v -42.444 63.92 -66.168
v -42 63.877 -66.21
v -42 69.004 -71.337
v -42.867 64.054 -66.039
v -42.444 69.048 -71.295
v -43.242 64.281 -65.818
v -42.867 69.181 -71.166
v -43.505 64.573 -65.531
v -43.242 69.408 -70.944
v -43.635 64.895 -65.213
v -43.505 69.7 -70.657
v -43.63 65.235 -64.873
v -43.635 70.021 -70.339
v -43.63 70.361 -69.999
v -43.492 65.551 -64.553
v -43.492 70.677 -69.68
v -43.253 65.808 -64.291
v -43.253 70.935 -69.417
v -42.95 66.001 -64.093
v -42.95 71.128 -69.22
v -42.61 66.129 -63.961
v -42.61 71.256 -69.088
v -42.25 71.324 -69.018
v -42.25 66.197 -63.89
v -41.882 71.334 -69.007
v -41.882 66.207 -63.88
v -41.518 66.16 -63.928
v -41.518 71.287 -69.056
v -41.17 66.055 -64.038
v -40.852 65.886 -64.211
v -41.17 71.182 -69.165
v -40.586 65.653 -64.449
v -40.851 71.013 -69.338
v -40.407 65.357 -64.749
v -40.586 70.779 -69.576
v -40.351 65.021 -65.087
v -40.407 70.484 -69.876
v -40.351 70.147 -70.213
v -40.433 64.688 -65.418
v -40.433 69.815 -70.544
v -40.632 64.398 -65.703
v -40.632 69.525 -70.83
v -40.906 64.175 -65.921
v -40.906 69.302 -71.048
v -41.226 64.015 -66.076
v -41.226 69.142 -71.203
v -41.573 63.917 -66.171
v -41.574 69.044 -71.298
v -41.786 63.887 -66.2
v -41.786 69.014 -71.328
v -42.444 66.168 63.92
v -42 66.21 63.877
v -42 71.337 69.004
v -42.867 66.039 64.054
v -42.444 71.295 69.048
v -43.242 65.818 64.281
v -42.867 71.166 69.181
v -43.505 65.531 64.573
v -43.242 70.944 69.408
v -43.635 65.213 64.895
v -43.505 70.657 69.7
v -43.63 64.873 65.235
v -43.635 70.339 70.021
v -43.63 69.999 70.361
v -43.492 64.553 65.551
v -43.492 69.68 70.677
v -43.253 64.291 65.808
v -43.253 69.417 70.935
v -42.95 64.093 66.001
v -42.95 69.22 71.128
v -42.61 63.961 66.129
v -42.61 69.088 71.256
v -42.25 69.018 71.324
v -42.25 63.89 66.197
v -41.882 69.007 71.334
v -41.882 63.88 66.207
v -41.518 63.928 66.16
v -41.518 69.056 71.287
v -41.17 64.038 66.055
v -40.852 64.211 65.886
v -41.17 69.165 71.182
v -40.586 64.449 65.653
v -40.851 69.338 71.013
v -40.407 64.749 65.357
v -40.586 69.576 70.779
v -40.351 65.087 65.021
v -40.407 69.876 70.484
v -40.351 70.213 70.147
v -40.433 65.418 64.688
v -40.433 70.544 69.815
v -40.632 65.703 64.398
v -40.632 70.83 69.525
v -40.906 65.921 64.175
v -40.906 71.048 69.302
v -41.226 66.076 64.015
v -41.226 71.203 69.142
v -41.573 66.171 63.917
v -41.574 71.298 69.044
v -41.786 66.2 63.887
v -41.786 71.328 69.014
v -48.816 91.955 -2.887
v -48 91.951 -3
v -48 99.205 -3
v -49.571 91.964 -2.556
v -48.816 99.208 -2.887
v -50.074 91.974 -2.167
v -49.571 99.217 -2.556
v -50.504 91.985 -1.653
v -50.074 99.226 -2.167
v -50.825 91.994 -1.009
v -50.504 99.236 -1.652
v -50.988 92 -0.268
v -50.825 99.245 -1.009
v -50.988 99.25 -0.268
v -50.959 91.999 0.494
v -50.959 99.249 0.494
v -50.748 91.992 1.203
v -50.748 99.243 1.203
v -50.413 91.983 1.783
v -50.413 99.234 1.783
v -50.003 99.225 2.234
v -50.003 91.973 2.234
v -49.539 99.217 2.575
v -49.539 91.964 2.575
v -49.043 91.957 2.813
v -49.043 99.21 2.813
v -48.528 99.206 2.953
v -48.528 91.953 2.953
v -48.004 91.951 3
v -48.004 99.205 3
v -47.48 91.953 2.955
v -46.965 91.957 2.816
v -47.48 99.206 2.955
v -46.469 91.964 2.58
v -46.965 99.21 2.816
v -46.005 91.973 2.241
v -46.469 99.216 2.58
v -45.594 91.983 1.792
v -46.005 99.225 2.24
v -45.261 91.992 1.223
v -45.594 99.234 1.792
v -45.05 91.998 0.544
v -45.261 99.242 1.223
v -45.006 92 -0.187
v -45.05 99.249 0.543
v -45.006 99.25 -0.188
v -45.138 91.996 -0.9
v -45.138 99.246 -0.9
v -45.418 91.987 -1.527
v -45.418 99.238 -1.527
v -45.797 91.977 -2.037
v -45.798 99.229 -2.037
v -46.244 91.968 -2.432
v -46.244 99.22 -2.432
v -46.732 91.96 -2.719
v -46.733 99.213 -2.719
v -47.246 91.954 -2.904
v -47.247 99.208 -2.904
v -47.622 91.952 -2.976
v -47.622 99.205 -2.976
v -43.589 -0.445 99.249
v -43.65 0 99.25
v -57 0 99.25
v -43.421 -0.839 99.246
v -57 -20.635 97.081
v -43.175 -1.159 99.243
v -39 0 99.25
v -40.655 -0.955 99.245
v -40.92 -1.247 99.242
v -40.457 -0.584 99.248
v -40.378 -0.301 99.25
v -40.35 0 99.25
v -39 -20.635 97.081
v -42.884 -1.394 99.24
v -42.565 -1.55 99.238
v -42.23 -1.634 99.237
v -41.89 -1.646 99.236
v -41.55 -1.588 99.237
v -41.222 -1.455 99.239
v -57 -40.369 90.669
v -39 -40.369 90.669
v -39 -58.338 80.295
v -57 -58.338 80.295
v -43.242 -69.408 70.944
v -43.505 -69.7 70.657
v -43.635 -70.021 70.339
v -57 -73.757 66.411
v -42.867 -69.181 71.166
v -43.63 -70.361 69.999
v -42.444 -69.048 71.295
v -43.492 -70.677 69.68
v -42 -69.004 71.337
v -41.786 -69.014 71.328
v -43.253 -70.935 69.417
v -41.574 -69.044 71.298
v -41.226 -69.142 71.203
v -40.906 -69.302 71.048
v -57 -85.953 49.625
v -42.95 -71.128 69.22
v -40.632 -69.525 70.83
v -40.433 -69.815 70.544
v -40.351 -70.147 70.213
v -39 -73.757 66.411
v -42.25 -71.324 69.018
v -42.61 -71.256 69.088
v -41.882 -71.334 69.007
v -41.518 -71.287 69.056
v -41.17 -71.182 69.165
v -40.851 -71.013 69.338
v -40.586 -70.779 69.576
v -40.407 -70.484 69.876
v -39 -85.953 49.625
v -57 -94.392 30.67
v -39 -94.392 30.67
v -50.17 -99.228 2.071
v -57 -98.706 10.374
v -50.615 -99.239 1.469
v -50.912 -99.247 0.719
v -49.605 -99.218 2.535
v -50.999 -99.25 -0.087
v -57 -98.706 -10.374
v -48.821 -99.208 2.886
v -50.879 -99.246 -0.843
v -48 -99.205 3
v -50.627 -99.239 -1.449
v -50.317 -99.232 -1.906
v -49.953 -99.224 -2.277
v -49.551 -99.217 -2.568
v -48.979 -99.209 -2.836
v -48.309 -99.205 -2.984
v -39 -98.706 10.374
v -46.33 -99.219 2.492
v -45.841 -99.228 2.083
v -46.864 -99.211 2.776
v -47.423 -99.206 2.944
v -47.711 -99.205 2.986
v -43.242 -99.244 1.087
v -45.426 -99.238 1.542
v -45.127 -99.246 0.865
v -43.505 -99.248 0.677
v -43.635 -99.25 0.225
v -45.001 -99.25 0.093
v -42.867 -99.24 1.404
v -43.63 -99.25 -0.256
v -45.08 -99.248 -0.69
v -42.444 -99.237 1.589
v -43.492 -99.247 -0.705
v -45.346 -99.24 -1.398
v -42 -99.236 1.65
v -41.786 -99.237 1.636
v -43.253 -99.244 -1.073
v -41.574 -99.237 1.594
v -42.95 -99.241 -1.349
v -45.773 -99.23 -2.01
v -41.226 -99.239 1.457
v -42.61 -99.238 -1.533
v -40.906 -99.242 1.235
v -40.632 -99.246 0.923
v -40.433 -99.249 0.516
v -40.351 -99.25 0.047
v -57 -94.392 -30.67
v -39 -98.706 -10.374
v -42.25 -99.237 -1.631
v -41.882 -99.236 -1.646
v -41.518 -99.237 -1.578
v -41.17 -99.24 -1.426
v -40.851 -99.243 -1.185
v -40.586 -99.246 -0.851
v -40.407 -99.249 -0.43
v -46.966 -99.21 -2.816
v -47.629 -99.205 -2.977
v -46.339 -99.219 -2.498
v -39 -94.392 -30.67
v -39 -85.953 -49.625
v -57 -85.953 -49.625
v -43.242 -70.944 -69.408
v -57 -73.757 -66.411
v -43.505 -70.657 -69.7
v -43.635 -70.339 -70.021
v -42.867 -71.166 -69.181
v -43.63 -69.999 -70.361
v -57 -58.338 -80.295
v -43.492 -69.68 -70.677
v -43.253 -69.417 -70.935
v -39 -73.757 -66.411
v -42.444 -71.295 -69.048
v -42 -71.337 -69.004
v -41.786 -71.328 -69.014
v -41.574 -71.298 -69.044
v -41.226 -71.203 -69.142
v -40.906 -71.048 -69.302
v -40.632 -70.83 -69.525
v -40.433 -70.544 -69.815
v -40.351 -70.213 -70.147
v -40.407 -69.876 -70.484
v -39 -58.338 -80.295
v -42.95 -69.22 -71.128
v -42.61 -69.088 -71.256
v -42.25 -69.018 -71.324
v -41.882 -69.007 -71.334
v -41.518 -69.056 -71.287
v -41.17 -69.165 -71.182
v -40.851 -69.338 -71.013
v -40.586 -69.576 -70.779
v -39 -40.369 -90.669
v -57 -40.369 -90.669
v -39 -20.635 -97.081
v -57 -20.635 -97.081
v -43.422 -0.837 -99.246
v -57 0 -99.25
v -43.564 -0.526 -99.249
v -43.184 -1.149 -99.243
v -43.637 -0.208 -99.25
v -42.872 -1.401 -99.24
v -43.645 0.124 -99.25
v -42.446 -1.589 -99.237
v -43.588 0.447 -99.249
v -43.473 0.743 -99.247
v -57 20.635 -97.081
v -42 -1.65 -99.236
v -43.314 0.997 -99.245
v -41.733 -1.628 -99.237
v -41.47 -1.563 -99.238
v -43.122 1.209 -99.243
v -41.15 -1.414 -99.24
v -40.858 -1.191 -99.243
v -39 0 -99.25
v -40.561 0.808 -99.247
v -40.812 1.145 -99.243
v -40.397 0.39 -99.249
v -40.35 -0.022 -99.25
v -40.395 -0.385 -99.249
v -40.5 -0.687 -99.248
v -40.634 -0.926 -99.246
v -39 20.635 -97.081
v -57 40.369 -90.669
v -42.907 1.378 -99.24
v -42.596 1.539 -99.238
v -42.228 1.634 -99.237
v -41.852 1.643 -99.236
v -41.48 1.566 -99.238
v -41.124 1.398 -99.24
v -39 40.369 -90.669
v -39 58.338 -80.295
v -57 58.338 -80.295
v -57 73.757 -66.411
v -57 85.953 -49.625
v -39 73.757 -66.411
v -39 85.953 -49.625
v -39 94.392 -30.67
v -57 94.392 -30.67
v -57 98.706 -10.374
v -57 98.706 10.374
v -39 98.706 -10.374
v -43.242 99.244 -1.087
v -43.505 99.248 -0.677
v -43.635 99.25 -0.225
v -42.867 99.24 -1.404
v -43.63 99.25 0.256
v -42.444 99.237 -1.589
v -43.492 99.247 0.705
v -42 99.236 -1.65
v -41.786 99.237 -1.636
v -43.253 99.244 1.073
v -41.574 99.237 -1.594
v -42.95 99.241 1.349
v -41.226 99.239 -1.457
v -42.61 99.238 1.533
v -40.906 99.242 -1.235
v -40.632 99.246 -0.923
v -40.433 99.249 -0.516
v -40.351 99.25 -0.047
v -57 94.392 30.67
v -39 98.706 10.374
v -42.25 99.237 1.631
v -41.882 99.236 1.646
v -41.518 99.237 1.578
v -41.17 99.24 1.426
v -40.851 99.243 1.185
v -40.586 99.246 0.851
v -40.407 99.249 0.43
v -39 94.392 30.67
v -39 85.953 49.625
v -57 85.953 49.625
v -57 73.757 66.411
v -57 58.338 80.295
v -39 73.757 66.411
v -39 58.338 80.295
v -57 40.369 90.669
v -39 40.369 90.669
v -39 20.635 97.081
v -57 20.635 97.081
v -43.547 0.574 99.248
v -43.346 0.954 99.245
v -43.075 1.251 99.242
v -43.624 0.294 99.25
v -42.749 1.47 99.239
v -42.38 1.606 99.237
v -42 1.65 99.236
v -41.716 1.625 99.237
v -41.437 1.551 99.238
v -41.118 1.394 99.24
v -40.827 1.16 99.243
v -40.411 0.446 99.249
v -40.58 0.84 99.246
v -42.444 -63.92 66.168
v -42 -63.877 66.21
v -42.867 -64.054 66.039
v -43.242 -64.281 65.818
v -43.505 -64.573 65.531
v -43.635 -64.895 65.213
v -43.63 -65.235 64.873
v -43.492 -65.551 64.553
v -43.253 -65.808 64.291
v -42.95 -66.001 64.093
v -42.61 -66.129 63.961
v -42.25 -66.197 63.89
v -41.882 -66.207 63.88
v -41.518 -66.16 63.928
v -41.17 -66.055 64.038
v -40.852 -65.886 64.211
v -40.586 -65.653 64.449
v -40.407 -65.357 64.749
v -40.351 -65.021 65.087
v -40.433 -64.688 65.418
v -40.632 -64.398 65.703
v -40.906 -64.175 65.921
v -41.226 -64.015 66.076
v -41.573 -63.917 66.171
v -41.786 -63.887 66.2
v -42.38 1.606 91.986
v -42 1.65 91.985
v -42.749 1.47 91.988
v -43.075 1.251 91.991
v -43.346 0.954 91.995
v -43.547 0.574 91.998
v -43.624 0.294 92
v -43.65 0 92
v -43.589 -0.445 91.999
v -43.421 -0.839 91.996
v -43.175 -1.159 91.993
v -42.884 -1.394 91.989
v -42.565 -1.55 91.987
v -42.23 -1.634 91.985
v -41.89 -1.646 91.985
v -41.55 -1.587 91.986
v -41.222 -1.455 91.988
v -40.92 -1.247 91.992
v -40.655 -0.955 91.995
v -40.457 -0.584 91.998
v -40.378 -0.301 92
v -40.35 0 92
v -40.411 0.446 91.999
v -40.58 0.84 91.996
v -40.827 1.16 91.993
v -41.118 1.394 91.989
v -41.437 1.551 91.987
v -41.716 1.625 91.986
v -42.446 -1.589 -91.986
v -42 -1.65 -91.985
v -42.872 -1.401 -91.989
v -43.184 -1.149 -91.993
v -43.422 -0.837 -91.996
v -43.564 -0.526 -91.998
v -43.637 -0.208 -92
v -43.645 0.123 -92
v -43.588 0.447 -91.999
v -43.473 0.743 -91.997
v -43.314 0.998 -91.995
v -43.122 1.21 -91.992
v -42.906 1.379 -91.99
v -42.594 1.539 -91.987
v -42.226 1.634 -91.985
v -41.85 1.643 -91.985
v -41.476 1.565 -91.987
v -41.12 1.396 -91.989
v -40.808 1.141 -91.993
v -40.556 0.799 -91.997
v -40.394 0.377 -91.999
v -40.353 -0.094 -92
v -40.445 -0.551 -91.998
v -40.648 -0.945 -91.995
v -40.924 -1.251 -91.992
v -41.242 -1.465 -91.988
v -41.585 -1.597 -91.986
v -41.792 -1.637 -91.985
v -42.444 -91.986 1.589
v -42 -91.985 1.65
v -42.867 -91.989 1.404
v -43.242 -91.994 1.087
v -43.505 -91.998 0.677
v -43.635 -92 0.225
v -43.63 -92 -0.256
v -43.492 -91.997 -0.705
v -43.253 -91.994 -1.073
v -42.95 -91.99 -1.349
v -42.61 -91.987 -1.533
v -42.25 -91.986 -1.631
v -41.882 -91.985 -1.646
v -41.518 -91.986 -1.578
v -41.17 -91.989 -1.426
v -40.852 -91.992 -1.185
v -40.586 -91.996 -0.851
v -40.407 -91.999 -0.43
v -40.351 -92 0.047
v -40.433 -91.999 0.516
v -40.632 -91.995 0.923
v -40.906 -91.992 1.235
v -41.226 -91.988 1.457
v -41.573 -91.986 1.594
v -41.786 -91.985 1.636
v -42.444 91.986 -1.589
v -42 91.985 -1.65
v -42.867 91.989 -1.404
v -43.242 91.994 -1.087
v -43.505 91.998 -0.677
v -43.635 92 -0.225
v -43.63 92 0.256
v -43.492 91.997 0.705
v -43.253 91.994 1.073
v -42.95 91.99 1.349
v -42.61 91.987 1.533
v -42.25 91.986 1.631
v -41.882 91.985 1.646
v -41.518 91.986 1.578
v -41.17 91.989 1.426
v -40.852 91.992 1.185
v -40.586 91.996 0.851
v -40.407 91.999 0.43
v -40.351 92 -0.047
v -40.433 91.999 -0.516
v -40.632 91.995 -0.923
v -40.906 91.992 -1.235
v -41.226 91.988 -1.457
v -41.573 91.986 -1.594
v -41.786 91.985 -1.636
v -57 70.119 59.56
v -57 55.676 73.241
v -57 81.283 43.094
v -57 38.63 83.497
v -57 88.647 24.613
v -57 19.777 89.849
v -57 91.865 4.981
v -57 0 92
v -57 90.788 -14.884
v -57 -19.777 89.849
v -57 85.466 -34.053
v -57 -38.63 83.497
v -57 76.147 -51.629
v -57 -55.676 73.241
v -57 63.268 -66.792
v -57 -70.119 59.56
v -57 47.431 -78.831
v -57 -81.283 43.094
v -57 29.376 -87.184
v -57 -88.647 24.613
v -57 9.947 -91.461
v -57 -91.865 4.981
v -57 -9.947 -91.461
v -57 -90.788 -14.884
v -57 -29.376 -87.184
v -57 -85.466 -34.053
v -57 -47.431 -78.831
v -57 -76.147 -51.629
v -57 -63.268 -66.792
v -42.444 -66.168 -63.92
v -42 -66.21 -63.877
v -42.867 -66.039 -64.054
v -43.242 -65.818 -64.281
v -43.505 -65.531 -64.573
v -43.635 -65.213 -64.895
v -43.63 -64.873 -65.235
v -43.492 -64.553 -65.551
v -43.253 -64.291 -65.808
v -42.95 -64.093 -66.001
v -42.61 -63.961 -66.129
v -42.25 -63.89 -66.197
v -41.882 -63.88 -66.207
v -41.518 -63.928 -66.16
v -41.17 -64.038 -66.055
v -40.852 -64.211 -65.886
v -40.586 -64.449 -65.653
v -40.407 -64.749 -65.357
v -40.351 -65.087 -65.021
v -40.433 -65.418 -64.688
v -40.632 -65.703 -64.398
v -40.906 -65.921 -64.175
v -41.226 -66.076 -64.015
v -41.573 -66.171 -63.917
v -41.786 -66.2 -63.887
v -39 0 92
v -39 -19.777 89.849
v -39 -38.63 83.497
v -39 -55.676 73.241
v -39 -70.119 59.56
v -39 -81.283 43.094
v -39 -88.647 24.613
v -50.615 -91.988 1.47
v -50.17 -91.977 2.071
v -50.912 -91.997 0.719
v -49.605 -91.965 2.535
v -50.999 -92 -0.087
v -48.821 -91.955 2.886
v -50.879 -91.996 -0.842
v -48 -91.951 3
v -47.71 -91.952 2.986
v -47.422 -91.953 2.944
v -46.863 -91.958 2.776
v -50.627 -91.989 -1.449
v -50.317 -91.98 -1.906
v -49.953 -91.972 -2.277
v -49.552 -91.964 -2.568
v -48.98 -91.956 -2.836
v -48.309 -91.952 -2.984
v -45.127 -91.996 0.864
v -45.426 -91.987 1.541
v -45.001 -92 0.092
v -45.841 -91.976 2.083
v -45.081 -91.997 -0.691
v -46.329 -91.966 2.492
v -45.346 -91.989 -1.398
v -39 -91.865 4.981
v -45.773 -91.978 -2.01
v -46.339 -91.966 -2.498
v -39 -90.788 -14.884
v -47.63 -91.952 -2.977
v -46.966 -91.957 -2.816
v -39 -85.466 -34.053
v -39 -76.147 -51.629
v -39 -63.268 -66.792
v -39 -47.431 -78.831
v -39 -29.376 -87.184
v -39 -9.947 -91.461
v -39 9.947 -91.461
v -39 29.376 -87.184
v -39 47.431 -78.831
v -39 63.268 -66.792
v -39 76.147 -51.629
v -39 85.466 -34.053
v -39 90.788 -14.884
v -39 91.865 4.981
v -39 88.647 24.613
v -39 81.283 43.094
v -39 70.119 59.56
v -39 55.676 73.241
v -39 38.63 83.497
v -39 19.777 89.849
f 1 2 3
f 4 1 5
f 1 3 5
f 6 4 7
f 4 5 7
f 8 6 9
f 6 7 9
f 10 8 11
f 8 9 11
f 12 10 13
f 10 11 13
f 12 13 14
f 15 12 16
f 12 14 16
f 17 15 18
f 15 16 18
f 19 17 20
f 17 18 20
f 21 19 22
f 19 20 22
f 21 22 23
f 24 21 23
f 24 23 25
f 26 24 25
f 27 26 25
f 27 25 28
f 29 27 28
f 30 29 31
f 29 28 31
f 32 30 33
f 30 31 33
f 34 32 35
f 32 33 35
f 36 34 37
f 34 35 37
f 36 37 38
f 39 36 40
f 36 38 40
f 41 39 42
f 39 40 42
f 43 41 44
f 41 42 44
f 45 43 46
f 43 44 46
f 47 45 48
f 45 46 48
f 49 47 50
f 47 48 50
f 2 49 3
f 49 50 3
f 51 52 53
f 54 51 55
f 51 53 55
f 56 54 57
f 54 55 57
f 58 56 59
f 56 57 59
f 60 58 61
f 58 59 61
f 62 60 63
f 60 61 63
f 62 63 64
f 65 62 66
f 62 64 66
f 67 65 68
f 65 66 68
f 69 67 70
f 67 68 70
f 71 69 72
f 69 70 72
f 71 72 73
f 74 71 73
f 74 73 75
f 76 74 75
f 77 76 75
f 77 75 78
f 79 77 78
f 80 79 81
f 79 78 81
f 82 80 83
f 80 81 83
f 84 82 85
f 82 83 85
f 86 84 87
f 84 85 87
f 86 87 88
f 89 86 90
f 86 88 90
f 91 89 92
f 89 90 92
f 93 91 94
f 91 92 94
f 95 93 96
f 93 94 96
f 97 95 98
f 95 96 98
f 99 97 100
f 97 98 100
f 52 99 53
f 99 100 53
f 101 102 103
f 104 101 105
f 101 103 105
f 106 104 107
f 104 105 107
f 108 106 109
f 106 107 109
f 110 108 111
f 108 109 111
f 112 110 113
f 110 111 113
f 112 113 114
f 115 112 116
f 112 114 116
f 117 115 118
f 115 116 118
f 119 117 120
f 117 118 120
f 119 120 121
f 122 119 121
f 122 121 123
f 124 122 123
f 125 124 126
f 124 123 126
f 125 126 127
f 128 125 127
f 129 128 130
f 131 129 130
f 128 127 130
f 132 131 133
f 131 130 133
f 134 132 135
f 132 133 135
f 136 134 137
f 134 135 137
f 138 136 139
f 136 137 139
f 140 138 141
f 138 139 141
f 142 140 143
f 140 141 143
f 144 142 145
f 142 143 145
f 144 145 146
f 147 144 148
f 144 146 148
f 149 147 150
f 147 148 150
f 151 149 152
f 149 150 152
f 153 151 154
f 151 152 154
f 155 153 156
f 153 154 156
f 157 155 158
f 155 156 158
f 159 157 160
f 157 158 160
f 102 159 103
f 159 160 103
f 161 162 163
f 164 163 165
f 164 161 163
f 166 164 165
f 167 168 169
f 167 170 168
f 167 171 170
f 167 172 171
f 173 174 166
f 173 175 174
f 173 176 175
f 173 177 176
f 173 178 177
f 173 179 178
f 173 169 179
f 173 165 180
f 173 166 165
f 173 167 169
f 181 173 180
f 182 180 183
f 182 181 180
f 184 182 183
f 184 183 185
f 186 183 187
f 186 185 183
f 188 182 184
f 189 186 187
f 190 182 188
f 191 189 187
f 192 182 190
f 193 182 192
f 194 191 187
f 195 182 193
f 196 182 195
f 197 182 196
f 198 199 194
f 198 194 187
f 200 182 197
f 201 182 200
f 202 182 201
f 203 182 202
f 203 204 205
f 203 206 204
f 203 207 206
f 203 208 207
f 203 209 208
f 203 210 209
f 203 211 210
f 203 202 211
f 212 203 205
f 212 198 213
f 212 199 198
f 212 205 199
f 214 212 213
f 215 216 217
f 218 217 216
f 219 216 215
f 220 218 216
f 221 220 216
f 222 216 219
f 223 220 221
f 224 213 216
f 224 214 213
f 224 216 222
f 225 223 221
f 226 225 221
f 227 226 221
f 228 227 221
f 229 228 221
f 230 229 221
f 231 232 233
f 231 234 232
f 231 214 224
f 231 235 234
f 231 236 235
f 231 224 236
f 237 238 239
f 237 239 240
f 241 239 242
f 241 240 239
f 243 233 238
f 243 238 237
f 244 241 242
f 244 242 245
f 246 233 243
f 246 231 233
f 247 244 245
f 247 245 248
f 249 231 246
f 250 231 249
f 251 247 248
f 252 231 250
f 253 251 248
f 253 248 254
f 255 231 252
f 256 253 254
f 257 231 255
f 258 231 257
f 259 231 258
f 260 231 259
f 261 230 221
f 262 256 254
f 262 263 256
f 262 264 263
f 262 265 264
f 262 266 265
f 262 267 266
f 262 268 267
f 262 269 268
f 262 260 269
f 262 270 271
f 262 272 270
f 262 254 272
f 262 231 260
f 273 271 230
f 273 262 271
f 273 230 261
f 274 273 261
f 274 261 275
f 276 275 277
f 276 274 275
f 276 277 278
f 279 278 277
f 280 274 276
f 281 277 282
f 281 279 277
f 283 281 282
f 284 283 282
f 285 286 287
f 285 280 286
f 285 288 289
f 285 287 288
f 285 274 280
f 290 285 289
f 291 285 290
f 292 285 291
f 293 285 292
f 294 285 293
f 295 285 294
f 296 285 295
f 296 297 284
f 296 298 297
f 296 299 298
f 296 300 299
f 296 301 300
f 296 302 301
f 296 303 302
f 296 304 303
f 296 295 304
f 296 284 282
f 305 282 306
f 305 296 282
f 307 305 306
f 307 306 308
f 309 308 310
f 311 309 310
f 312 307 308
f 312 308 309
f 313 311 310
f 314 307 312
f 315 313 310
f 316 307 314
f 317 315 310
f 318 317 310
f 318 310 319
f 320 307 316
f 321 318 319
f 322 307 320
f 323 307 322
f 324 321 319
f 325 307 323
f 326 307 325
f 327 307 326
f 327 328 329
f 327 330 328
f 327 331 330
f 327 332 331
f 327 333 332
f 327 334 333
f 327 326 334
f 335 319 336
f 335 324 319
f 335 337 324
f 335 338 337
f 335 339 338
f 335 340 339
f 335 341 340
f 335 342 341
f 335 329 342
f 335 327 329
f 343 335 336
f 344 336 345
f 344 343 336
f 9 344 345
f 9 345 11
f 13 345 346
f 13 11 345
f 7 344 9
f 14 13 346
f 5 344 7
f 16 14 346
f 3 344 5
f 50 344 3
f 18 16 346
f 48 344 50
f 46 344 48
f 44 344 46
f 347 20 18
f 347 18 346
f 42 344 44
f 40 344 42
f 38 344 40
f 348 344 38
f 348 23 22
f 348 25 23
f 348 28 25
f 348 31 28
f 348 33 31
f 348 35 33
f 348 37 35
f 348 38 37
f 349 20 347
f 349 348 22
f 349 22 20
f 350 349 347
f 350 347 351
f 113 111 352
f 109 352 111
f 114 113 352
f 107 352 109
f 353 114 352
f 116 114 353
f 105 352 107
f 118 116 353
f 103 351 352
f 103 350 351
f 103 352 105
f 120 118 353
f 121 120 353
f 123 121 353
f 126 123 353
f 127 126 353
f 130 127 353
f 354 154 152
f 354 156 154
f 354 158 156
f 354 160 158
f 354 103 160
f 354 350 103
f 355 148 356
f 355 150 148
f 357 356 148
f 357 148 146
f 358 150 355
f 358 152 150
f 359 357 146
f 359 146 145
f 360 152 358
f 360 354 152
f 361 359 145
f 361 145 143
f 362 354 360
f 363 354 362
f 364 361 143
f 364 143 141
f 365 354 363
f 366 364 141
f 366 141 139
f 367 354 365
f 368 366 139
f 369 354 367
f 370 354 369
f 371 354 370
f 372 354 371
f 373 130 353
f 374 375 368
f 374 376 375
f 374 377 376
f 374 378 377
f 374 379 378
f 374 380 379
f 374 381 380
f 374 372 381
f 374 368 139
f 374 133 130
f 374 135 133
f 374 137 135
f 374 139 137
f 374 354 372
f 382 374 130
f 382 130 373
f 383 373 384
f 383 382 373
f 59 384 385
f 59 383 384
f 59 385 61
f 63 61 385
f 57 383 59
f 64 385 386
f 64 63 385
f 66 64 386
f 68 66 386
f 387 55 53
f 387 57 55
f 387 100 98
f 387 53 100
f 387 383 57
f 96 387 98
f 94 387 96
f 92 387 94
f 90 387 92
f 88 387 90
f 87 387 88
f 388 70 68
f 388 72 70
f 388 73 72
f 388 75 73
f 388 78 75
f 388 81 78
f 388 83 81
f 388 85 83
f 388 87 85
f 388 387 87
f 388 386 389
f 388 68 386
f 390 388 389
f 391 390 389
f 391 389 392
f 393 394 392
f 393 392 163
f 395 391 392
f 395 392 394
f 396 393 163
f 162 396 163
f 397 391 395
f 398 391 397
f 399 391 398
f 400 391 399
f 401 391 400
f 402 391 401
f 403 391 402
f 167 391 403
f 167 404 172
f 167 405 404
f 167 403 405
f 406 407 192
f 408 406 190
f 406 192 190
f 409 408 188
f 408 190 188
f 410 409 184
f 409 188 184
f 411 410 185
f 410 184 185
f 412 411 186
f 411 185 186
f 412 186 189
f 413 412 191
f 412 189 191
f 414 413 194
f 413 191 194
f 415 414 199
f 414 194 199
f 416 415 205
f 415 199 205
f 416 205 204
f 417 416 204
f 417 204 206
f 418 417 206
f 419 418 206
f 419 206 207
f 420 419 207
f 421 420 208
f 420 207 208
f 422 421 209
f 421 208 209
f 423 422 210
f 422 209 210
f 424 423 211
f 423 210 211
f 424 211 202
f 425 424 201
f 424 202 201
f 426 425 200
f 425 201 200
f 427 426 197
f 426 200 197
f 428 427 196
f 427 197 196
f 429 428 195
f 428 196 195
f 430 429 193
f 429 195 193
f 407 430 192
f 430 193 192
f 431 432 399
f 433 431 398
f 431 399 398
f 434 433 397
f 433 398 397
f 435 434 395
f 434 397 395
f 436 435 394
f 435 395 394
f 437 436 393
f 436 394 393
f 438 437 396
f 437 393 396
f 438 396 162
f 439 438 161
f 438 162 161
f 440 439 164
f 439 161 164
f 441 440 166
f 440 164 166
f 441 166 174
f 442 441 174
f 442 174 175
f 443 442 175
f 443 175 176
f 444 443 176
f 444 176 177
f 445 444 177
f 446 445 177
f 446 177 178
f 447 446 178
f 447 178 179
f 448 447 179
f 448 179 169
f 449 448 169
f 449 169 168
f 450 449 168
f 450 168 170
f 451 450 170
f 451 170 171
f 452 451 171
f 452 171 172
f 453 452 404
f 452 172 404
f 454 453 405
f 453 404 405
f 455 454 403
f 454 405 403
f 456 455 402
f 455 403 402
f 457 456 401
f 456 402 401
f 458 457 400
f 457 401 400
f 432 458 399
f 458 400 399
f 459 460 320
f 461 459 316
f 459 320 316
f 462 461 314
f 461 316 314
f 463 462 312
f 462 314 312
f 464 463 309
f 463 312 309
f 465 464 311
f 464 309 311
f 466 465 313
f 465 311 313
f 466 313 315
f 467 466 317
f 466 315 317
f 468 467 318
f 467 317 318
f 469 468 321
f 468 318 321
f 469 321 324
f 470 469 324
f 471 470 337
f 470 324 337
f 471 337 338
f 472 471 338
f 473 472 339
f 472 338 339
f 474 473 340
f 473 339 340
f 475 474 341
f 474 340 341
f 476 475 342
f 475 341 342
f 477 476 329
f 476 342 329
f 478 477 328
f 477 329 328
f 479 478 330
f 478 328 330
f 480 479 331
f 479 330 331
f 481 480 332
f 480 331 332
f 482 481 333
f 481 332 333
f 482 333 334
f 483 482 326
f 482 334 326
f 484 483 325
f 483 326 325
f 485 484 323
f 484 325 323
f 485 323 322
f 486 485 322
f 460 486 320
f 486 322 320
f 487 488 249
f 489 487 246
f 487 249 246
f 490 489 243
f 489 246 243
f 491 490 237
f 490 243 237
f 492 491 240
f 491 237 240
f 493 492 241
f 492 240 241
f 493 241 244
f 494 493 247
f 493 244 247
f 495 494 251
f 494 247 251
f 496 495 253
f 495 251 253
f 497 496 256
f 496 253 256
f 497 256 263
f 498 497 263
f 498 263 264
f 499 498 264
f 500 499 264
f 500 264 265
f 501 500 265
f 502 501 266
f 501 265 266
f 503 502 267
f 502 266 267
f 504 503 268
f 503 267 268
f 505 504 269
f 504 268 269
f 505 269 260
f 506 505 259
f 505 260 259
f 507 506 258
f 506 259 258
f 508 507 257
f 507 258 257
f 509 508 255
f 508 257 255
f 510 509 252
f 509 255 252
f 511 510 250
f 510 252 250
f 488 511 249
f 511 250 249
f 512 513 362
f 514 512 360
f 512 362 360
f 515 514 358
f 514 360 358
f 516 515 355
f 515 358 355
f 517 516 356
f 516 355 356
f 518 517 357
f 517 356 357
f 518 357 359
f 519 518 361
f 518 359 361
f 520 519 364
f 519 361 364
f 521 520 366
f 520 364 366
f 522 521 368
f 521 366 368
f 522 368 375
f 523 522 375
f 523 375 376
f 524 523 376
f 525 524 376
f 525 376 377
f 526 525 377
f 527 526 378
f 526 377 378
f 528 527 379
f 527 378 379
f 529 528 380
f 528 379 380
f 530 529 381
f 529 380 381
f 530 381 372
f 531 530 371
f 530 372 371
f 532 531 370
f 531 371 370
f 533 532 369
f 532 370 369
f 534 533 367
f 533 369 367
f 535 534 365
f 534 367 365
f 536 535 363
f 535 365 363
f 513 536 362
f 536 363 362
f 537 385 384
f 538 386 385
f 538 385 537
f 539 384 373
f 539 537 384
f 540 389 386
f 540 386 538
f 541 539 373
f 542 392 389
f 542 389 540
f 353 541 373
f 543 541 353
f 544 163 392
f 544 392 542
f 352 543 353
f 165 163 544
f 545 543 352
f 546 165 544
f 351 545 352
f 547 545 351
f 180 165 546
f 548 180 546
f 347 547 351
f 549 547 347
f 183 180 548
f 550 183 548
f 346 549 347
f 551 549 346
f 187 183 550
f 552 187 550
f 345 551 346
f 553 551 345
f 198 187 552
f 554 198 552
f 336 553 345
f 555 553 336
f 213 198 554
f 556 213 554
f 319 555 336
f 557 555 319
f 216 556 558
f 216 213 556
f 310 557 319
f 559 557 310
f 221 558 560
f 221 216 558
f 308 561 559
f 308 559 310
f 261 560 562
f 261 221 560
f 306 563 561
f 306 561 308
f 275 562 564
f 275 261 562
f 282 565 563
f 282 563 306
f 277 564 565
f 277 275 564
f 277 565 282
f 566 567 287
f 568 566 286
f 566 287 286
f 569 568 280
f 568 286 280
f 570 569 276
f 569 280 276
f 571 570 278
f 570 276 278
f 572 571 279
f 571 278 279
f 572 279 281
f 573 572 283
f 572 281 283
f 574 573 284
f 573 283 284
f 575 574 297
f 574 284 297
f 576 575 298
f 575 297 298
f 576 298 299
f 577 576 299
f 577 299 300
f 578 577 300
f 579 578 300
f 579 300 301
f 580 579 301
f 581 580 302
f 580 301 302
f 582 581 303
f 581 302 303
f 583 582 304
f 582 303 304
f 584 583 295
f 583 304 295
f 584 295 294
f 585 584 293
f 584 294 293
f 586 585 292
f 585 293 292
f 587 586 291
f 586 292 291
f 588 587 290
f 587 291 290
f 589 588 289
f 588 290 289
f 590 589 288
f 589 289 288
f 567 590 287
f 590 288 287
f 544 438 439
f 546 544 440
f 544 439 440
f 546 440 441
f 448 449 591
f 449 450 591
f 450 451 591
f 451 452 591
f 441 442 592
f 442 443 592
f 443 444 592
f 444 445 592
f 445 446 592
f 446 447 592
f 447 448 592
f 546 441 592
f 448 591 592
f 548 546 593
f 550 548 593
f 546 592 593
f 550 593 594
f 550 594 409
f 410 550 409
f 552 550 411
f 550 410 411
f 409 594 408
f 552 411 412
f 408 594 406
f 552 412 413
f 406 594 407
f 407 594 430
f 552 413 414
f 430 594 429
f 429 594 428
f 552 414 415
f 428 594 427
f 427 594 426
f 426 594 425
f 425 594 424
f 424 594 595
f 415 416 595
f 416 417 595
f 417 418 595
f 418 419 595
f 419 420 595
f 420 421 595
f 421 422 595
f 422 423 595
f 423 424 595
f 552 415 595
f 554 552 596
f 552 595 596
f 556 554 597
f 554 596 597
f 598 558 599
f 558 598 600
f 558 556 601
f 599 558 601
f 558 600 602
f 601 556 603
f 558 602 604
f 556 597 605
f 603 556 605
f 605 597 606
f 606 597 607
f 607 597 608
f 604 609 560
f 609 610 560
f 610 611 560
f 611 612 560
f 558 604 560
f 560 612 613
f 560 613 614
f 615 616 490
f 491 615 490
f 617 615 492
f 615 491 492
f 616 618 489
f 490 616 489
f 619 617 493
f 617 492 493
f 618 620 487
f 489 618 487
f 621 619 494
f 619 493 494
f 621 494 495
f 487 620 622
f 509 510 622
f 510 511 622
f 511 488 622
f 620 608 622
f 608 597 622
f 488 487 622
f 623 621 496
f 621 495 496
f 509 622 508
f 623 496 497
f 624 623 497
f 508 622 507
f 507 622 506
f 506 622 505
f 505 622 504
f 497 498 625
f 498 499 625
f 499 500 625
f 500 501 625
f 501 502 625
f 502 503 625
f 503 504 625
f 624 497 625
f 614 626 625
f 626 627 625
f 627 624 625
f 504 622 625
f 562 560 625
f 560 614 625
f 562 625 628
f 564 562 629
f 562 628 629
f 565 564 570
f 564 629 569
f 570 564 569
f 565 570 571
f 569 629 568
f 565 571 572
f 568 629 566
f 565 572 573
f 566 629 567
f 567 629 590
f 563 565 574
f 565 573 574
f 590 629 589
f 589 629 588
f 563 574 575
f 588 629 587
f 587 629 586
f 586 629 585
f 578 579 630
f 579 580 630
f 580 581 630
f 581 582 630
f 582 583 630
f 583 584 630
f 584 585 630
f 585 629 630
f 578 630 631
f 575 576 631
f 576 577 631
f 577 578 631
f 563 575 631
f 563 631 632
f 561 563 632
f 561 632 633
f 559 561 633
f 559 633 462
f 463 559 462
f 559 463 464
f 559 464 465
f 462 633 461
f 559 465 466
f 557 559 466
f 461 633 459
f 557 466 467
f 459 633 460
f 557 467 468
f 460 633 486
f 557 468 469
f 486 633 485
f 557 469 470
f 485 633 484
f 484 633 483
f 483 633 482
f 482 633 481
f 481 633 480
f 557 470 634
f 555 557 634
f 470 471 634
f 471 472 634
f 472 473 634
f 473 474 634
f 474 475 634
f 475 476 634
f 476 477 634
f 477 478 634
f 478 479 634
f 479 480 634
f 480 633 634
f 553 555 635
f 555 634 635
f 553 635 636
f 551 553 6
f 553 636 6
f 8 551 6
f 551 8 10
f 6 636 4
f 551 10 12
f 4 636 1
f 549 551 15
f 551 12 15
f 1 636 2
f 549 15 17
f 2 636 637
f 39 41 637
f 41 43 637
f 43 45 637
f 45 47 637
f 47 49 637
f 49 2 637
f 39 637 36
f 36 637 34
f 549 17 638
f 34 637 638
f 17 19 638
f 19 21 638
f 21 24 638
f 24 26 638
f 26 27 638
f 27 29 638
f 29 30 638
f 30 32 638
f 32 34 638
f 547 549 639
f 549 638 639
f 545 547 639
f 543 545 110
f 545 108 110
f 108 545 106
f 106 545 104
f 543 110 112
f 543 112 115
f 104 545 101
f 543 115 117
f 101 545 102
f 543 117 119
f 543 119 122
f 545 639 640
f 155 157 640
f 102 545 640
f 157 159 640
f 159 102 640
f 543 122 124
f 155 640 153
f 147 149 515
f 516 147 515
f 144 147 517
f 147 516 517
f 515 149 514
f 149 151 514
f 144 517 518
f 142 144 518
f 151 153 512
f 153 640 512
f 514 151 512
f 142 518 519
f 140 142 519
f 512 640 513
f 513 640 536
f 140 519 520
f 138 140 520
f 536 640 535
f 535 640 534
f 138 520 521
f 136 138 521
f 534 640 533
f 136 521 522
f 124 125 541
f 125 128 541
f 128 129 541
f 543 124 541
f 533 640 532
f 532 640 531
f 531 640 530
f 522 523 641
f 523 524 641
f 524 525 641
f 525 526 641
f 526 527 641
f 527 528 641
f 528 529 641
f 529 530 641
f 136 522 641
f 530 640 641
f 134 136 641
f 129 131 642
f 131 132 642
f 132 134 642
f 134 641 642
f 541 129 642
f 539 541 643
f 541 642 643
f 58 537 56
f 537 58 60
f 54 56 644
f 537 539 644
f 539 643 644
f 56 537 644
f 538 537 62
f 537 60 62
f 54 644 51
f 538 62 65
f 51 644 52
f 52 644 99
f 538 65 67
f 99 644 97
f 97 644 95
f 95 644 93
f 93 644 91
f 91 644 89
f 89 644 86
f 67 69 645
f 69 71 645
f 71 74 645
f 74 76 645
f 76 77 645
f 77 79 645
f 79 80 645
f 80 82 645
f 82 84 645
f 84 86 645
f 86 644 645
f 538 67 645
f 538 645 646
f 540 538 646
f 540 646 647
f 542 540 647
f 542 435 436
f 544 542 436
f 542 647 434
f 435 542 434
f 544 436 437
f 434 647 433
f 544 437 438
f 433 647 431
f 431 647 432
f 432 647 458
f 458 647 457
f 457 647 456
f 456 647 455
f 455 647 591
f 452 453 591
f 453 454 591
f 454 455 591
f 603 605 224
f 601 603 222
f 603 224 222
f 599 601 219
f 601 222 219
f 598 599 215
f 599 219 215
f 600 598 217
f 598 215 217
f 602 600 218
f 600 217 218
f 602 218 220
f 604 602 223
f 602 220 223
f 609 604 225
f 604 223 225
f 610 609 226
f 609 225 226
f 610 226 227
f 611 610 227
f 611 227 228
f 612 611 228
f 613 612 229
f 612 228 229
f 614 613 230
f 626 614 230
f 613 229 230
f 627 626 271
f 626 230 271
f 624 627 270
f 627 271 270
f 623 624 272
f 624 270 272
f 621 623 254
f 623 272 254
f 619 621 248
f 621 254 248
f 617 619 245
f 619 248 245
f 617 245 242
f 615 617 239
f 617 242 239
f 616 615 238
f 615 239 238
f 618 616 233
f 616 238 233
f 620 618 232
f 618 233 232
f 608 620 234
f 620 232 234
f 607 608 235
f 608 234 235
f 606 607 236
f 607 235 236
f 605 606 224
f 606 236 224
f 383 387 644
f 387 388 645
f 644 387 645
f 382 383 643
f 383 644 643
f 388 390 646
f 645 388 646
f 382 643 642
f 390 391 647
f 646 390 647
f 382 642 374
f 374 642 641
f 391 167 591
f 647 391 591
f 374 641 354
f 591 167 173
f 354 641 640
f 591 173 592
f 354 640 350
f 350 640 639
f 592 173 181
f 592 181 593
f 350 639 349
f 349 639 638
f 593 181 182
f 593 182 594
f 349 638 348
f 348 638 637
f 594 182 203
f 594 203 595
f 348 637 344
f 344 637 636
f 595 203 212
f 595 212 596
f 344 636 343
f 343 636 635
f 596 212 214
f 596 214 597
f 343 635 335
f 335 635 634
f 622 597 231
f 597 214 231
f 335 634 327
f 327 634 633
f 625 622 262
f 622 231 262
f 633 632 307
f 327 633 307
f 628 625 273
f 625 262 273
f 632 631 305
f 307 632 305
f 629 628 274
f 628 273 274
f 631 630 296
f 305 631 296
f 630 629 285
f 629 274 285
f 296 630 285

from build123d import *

# Parameters (mm, degrees)
MOUNT_SKETCH_W       = 18
MOUNT_SKETCH_H       = 7.25
PIN_HOLE_SKETCH_W    = 3
PIN_HOLE_SKETCH_H    = 9.25
PIN_HOLES_X2_COUNT   = 2
SCREW_HOLE_SKETCH_W  = 1.65
SCREW_HOLE_SKETCH_H  = 9.25
SCREW_HOLES_X8_COUNT = 8


with BuildPart() as part:
    # Mount Sketch → Mount (revolve)
    with BuildSketch(Plane.XY, mode=Mode.PRIVATE) as mount_sk:
        with Locations((-48, 95.625)):
            Rectangle(MOUNT_SKETCH_W, MOUNT_SKETCH_H)
    revolve(mount_sk.sketch.rotate(Axis((-108, 0, 0), (1, 0, 0)), 90), axis=Axis((-108, 0, 0), (1, 0, 0)))

    # Pin Hole Sketch → Pin Hole (revolve, cut)
    with BuildSketch(Plane.XY, mode=Mode.PRIVATE) as pin_hole_sk:
        with Locations((-46.5, 95.625)):
            Rectangle(PIN_HOLE_SKETCH_W, PIN_HOLE_SKETCH_H)
    pin_hole = revolve(pin_hole_sk.sketch.rotate(Axis((-48, 82, 0), (0, 1, 0)), 90), axis=Axis((-48, 82, 0), (0, 1, 0)), mode=Mode.SUBTRACT)

    # Pin Holes x2: Pin Hole ×2 about axis
    pin_holes_x2_axis = Axis((-38.1, 0, 0), (-1, 0, 0))
    for i in range(1, PIN_HOLES_X2_COUNT):
        add(pin_hole.rotate(pin_holes_x2_axis, i * 360 / PIN_HOLES_X2_COUNT), mode=Mode.SUBTRACT)

    # Screw Hole Sketch → Screw Hole (revolve, cut)
    with BuildSketch(Plane.XY, mode=Mode.PRIVATE) as screw_hole_sk:
        with Locations((-41.175, 95.625)):
            Rectangle(SCREW_HOLE_SKETCH_W, SCREW_HOLE_SKETCH_H)
    screw_hole = revolve(screw_hole_sk.sketch.rotate(Axis((-42, 82, 0), (0, 1, 0)), 90), axis=Axis((-42, 82, 0), (0, 1, 0)), mode=Mode.SUBTRACT)

    # Screw Holes x8: Screw Hole ×8 about axis
    screw_holes_x8_axis = Axis((-38.1, 0, 0), (-1, 0, 0))
    for i in range(1, SCREW_HOLES_X8_COUNT):
        add(screw_hole.rotate(screw_holes_x8_axis, i * 360 / SCREW_HOLES_X8_COUNT), mode=Mode.SUBTRACT)


solid = part.part
